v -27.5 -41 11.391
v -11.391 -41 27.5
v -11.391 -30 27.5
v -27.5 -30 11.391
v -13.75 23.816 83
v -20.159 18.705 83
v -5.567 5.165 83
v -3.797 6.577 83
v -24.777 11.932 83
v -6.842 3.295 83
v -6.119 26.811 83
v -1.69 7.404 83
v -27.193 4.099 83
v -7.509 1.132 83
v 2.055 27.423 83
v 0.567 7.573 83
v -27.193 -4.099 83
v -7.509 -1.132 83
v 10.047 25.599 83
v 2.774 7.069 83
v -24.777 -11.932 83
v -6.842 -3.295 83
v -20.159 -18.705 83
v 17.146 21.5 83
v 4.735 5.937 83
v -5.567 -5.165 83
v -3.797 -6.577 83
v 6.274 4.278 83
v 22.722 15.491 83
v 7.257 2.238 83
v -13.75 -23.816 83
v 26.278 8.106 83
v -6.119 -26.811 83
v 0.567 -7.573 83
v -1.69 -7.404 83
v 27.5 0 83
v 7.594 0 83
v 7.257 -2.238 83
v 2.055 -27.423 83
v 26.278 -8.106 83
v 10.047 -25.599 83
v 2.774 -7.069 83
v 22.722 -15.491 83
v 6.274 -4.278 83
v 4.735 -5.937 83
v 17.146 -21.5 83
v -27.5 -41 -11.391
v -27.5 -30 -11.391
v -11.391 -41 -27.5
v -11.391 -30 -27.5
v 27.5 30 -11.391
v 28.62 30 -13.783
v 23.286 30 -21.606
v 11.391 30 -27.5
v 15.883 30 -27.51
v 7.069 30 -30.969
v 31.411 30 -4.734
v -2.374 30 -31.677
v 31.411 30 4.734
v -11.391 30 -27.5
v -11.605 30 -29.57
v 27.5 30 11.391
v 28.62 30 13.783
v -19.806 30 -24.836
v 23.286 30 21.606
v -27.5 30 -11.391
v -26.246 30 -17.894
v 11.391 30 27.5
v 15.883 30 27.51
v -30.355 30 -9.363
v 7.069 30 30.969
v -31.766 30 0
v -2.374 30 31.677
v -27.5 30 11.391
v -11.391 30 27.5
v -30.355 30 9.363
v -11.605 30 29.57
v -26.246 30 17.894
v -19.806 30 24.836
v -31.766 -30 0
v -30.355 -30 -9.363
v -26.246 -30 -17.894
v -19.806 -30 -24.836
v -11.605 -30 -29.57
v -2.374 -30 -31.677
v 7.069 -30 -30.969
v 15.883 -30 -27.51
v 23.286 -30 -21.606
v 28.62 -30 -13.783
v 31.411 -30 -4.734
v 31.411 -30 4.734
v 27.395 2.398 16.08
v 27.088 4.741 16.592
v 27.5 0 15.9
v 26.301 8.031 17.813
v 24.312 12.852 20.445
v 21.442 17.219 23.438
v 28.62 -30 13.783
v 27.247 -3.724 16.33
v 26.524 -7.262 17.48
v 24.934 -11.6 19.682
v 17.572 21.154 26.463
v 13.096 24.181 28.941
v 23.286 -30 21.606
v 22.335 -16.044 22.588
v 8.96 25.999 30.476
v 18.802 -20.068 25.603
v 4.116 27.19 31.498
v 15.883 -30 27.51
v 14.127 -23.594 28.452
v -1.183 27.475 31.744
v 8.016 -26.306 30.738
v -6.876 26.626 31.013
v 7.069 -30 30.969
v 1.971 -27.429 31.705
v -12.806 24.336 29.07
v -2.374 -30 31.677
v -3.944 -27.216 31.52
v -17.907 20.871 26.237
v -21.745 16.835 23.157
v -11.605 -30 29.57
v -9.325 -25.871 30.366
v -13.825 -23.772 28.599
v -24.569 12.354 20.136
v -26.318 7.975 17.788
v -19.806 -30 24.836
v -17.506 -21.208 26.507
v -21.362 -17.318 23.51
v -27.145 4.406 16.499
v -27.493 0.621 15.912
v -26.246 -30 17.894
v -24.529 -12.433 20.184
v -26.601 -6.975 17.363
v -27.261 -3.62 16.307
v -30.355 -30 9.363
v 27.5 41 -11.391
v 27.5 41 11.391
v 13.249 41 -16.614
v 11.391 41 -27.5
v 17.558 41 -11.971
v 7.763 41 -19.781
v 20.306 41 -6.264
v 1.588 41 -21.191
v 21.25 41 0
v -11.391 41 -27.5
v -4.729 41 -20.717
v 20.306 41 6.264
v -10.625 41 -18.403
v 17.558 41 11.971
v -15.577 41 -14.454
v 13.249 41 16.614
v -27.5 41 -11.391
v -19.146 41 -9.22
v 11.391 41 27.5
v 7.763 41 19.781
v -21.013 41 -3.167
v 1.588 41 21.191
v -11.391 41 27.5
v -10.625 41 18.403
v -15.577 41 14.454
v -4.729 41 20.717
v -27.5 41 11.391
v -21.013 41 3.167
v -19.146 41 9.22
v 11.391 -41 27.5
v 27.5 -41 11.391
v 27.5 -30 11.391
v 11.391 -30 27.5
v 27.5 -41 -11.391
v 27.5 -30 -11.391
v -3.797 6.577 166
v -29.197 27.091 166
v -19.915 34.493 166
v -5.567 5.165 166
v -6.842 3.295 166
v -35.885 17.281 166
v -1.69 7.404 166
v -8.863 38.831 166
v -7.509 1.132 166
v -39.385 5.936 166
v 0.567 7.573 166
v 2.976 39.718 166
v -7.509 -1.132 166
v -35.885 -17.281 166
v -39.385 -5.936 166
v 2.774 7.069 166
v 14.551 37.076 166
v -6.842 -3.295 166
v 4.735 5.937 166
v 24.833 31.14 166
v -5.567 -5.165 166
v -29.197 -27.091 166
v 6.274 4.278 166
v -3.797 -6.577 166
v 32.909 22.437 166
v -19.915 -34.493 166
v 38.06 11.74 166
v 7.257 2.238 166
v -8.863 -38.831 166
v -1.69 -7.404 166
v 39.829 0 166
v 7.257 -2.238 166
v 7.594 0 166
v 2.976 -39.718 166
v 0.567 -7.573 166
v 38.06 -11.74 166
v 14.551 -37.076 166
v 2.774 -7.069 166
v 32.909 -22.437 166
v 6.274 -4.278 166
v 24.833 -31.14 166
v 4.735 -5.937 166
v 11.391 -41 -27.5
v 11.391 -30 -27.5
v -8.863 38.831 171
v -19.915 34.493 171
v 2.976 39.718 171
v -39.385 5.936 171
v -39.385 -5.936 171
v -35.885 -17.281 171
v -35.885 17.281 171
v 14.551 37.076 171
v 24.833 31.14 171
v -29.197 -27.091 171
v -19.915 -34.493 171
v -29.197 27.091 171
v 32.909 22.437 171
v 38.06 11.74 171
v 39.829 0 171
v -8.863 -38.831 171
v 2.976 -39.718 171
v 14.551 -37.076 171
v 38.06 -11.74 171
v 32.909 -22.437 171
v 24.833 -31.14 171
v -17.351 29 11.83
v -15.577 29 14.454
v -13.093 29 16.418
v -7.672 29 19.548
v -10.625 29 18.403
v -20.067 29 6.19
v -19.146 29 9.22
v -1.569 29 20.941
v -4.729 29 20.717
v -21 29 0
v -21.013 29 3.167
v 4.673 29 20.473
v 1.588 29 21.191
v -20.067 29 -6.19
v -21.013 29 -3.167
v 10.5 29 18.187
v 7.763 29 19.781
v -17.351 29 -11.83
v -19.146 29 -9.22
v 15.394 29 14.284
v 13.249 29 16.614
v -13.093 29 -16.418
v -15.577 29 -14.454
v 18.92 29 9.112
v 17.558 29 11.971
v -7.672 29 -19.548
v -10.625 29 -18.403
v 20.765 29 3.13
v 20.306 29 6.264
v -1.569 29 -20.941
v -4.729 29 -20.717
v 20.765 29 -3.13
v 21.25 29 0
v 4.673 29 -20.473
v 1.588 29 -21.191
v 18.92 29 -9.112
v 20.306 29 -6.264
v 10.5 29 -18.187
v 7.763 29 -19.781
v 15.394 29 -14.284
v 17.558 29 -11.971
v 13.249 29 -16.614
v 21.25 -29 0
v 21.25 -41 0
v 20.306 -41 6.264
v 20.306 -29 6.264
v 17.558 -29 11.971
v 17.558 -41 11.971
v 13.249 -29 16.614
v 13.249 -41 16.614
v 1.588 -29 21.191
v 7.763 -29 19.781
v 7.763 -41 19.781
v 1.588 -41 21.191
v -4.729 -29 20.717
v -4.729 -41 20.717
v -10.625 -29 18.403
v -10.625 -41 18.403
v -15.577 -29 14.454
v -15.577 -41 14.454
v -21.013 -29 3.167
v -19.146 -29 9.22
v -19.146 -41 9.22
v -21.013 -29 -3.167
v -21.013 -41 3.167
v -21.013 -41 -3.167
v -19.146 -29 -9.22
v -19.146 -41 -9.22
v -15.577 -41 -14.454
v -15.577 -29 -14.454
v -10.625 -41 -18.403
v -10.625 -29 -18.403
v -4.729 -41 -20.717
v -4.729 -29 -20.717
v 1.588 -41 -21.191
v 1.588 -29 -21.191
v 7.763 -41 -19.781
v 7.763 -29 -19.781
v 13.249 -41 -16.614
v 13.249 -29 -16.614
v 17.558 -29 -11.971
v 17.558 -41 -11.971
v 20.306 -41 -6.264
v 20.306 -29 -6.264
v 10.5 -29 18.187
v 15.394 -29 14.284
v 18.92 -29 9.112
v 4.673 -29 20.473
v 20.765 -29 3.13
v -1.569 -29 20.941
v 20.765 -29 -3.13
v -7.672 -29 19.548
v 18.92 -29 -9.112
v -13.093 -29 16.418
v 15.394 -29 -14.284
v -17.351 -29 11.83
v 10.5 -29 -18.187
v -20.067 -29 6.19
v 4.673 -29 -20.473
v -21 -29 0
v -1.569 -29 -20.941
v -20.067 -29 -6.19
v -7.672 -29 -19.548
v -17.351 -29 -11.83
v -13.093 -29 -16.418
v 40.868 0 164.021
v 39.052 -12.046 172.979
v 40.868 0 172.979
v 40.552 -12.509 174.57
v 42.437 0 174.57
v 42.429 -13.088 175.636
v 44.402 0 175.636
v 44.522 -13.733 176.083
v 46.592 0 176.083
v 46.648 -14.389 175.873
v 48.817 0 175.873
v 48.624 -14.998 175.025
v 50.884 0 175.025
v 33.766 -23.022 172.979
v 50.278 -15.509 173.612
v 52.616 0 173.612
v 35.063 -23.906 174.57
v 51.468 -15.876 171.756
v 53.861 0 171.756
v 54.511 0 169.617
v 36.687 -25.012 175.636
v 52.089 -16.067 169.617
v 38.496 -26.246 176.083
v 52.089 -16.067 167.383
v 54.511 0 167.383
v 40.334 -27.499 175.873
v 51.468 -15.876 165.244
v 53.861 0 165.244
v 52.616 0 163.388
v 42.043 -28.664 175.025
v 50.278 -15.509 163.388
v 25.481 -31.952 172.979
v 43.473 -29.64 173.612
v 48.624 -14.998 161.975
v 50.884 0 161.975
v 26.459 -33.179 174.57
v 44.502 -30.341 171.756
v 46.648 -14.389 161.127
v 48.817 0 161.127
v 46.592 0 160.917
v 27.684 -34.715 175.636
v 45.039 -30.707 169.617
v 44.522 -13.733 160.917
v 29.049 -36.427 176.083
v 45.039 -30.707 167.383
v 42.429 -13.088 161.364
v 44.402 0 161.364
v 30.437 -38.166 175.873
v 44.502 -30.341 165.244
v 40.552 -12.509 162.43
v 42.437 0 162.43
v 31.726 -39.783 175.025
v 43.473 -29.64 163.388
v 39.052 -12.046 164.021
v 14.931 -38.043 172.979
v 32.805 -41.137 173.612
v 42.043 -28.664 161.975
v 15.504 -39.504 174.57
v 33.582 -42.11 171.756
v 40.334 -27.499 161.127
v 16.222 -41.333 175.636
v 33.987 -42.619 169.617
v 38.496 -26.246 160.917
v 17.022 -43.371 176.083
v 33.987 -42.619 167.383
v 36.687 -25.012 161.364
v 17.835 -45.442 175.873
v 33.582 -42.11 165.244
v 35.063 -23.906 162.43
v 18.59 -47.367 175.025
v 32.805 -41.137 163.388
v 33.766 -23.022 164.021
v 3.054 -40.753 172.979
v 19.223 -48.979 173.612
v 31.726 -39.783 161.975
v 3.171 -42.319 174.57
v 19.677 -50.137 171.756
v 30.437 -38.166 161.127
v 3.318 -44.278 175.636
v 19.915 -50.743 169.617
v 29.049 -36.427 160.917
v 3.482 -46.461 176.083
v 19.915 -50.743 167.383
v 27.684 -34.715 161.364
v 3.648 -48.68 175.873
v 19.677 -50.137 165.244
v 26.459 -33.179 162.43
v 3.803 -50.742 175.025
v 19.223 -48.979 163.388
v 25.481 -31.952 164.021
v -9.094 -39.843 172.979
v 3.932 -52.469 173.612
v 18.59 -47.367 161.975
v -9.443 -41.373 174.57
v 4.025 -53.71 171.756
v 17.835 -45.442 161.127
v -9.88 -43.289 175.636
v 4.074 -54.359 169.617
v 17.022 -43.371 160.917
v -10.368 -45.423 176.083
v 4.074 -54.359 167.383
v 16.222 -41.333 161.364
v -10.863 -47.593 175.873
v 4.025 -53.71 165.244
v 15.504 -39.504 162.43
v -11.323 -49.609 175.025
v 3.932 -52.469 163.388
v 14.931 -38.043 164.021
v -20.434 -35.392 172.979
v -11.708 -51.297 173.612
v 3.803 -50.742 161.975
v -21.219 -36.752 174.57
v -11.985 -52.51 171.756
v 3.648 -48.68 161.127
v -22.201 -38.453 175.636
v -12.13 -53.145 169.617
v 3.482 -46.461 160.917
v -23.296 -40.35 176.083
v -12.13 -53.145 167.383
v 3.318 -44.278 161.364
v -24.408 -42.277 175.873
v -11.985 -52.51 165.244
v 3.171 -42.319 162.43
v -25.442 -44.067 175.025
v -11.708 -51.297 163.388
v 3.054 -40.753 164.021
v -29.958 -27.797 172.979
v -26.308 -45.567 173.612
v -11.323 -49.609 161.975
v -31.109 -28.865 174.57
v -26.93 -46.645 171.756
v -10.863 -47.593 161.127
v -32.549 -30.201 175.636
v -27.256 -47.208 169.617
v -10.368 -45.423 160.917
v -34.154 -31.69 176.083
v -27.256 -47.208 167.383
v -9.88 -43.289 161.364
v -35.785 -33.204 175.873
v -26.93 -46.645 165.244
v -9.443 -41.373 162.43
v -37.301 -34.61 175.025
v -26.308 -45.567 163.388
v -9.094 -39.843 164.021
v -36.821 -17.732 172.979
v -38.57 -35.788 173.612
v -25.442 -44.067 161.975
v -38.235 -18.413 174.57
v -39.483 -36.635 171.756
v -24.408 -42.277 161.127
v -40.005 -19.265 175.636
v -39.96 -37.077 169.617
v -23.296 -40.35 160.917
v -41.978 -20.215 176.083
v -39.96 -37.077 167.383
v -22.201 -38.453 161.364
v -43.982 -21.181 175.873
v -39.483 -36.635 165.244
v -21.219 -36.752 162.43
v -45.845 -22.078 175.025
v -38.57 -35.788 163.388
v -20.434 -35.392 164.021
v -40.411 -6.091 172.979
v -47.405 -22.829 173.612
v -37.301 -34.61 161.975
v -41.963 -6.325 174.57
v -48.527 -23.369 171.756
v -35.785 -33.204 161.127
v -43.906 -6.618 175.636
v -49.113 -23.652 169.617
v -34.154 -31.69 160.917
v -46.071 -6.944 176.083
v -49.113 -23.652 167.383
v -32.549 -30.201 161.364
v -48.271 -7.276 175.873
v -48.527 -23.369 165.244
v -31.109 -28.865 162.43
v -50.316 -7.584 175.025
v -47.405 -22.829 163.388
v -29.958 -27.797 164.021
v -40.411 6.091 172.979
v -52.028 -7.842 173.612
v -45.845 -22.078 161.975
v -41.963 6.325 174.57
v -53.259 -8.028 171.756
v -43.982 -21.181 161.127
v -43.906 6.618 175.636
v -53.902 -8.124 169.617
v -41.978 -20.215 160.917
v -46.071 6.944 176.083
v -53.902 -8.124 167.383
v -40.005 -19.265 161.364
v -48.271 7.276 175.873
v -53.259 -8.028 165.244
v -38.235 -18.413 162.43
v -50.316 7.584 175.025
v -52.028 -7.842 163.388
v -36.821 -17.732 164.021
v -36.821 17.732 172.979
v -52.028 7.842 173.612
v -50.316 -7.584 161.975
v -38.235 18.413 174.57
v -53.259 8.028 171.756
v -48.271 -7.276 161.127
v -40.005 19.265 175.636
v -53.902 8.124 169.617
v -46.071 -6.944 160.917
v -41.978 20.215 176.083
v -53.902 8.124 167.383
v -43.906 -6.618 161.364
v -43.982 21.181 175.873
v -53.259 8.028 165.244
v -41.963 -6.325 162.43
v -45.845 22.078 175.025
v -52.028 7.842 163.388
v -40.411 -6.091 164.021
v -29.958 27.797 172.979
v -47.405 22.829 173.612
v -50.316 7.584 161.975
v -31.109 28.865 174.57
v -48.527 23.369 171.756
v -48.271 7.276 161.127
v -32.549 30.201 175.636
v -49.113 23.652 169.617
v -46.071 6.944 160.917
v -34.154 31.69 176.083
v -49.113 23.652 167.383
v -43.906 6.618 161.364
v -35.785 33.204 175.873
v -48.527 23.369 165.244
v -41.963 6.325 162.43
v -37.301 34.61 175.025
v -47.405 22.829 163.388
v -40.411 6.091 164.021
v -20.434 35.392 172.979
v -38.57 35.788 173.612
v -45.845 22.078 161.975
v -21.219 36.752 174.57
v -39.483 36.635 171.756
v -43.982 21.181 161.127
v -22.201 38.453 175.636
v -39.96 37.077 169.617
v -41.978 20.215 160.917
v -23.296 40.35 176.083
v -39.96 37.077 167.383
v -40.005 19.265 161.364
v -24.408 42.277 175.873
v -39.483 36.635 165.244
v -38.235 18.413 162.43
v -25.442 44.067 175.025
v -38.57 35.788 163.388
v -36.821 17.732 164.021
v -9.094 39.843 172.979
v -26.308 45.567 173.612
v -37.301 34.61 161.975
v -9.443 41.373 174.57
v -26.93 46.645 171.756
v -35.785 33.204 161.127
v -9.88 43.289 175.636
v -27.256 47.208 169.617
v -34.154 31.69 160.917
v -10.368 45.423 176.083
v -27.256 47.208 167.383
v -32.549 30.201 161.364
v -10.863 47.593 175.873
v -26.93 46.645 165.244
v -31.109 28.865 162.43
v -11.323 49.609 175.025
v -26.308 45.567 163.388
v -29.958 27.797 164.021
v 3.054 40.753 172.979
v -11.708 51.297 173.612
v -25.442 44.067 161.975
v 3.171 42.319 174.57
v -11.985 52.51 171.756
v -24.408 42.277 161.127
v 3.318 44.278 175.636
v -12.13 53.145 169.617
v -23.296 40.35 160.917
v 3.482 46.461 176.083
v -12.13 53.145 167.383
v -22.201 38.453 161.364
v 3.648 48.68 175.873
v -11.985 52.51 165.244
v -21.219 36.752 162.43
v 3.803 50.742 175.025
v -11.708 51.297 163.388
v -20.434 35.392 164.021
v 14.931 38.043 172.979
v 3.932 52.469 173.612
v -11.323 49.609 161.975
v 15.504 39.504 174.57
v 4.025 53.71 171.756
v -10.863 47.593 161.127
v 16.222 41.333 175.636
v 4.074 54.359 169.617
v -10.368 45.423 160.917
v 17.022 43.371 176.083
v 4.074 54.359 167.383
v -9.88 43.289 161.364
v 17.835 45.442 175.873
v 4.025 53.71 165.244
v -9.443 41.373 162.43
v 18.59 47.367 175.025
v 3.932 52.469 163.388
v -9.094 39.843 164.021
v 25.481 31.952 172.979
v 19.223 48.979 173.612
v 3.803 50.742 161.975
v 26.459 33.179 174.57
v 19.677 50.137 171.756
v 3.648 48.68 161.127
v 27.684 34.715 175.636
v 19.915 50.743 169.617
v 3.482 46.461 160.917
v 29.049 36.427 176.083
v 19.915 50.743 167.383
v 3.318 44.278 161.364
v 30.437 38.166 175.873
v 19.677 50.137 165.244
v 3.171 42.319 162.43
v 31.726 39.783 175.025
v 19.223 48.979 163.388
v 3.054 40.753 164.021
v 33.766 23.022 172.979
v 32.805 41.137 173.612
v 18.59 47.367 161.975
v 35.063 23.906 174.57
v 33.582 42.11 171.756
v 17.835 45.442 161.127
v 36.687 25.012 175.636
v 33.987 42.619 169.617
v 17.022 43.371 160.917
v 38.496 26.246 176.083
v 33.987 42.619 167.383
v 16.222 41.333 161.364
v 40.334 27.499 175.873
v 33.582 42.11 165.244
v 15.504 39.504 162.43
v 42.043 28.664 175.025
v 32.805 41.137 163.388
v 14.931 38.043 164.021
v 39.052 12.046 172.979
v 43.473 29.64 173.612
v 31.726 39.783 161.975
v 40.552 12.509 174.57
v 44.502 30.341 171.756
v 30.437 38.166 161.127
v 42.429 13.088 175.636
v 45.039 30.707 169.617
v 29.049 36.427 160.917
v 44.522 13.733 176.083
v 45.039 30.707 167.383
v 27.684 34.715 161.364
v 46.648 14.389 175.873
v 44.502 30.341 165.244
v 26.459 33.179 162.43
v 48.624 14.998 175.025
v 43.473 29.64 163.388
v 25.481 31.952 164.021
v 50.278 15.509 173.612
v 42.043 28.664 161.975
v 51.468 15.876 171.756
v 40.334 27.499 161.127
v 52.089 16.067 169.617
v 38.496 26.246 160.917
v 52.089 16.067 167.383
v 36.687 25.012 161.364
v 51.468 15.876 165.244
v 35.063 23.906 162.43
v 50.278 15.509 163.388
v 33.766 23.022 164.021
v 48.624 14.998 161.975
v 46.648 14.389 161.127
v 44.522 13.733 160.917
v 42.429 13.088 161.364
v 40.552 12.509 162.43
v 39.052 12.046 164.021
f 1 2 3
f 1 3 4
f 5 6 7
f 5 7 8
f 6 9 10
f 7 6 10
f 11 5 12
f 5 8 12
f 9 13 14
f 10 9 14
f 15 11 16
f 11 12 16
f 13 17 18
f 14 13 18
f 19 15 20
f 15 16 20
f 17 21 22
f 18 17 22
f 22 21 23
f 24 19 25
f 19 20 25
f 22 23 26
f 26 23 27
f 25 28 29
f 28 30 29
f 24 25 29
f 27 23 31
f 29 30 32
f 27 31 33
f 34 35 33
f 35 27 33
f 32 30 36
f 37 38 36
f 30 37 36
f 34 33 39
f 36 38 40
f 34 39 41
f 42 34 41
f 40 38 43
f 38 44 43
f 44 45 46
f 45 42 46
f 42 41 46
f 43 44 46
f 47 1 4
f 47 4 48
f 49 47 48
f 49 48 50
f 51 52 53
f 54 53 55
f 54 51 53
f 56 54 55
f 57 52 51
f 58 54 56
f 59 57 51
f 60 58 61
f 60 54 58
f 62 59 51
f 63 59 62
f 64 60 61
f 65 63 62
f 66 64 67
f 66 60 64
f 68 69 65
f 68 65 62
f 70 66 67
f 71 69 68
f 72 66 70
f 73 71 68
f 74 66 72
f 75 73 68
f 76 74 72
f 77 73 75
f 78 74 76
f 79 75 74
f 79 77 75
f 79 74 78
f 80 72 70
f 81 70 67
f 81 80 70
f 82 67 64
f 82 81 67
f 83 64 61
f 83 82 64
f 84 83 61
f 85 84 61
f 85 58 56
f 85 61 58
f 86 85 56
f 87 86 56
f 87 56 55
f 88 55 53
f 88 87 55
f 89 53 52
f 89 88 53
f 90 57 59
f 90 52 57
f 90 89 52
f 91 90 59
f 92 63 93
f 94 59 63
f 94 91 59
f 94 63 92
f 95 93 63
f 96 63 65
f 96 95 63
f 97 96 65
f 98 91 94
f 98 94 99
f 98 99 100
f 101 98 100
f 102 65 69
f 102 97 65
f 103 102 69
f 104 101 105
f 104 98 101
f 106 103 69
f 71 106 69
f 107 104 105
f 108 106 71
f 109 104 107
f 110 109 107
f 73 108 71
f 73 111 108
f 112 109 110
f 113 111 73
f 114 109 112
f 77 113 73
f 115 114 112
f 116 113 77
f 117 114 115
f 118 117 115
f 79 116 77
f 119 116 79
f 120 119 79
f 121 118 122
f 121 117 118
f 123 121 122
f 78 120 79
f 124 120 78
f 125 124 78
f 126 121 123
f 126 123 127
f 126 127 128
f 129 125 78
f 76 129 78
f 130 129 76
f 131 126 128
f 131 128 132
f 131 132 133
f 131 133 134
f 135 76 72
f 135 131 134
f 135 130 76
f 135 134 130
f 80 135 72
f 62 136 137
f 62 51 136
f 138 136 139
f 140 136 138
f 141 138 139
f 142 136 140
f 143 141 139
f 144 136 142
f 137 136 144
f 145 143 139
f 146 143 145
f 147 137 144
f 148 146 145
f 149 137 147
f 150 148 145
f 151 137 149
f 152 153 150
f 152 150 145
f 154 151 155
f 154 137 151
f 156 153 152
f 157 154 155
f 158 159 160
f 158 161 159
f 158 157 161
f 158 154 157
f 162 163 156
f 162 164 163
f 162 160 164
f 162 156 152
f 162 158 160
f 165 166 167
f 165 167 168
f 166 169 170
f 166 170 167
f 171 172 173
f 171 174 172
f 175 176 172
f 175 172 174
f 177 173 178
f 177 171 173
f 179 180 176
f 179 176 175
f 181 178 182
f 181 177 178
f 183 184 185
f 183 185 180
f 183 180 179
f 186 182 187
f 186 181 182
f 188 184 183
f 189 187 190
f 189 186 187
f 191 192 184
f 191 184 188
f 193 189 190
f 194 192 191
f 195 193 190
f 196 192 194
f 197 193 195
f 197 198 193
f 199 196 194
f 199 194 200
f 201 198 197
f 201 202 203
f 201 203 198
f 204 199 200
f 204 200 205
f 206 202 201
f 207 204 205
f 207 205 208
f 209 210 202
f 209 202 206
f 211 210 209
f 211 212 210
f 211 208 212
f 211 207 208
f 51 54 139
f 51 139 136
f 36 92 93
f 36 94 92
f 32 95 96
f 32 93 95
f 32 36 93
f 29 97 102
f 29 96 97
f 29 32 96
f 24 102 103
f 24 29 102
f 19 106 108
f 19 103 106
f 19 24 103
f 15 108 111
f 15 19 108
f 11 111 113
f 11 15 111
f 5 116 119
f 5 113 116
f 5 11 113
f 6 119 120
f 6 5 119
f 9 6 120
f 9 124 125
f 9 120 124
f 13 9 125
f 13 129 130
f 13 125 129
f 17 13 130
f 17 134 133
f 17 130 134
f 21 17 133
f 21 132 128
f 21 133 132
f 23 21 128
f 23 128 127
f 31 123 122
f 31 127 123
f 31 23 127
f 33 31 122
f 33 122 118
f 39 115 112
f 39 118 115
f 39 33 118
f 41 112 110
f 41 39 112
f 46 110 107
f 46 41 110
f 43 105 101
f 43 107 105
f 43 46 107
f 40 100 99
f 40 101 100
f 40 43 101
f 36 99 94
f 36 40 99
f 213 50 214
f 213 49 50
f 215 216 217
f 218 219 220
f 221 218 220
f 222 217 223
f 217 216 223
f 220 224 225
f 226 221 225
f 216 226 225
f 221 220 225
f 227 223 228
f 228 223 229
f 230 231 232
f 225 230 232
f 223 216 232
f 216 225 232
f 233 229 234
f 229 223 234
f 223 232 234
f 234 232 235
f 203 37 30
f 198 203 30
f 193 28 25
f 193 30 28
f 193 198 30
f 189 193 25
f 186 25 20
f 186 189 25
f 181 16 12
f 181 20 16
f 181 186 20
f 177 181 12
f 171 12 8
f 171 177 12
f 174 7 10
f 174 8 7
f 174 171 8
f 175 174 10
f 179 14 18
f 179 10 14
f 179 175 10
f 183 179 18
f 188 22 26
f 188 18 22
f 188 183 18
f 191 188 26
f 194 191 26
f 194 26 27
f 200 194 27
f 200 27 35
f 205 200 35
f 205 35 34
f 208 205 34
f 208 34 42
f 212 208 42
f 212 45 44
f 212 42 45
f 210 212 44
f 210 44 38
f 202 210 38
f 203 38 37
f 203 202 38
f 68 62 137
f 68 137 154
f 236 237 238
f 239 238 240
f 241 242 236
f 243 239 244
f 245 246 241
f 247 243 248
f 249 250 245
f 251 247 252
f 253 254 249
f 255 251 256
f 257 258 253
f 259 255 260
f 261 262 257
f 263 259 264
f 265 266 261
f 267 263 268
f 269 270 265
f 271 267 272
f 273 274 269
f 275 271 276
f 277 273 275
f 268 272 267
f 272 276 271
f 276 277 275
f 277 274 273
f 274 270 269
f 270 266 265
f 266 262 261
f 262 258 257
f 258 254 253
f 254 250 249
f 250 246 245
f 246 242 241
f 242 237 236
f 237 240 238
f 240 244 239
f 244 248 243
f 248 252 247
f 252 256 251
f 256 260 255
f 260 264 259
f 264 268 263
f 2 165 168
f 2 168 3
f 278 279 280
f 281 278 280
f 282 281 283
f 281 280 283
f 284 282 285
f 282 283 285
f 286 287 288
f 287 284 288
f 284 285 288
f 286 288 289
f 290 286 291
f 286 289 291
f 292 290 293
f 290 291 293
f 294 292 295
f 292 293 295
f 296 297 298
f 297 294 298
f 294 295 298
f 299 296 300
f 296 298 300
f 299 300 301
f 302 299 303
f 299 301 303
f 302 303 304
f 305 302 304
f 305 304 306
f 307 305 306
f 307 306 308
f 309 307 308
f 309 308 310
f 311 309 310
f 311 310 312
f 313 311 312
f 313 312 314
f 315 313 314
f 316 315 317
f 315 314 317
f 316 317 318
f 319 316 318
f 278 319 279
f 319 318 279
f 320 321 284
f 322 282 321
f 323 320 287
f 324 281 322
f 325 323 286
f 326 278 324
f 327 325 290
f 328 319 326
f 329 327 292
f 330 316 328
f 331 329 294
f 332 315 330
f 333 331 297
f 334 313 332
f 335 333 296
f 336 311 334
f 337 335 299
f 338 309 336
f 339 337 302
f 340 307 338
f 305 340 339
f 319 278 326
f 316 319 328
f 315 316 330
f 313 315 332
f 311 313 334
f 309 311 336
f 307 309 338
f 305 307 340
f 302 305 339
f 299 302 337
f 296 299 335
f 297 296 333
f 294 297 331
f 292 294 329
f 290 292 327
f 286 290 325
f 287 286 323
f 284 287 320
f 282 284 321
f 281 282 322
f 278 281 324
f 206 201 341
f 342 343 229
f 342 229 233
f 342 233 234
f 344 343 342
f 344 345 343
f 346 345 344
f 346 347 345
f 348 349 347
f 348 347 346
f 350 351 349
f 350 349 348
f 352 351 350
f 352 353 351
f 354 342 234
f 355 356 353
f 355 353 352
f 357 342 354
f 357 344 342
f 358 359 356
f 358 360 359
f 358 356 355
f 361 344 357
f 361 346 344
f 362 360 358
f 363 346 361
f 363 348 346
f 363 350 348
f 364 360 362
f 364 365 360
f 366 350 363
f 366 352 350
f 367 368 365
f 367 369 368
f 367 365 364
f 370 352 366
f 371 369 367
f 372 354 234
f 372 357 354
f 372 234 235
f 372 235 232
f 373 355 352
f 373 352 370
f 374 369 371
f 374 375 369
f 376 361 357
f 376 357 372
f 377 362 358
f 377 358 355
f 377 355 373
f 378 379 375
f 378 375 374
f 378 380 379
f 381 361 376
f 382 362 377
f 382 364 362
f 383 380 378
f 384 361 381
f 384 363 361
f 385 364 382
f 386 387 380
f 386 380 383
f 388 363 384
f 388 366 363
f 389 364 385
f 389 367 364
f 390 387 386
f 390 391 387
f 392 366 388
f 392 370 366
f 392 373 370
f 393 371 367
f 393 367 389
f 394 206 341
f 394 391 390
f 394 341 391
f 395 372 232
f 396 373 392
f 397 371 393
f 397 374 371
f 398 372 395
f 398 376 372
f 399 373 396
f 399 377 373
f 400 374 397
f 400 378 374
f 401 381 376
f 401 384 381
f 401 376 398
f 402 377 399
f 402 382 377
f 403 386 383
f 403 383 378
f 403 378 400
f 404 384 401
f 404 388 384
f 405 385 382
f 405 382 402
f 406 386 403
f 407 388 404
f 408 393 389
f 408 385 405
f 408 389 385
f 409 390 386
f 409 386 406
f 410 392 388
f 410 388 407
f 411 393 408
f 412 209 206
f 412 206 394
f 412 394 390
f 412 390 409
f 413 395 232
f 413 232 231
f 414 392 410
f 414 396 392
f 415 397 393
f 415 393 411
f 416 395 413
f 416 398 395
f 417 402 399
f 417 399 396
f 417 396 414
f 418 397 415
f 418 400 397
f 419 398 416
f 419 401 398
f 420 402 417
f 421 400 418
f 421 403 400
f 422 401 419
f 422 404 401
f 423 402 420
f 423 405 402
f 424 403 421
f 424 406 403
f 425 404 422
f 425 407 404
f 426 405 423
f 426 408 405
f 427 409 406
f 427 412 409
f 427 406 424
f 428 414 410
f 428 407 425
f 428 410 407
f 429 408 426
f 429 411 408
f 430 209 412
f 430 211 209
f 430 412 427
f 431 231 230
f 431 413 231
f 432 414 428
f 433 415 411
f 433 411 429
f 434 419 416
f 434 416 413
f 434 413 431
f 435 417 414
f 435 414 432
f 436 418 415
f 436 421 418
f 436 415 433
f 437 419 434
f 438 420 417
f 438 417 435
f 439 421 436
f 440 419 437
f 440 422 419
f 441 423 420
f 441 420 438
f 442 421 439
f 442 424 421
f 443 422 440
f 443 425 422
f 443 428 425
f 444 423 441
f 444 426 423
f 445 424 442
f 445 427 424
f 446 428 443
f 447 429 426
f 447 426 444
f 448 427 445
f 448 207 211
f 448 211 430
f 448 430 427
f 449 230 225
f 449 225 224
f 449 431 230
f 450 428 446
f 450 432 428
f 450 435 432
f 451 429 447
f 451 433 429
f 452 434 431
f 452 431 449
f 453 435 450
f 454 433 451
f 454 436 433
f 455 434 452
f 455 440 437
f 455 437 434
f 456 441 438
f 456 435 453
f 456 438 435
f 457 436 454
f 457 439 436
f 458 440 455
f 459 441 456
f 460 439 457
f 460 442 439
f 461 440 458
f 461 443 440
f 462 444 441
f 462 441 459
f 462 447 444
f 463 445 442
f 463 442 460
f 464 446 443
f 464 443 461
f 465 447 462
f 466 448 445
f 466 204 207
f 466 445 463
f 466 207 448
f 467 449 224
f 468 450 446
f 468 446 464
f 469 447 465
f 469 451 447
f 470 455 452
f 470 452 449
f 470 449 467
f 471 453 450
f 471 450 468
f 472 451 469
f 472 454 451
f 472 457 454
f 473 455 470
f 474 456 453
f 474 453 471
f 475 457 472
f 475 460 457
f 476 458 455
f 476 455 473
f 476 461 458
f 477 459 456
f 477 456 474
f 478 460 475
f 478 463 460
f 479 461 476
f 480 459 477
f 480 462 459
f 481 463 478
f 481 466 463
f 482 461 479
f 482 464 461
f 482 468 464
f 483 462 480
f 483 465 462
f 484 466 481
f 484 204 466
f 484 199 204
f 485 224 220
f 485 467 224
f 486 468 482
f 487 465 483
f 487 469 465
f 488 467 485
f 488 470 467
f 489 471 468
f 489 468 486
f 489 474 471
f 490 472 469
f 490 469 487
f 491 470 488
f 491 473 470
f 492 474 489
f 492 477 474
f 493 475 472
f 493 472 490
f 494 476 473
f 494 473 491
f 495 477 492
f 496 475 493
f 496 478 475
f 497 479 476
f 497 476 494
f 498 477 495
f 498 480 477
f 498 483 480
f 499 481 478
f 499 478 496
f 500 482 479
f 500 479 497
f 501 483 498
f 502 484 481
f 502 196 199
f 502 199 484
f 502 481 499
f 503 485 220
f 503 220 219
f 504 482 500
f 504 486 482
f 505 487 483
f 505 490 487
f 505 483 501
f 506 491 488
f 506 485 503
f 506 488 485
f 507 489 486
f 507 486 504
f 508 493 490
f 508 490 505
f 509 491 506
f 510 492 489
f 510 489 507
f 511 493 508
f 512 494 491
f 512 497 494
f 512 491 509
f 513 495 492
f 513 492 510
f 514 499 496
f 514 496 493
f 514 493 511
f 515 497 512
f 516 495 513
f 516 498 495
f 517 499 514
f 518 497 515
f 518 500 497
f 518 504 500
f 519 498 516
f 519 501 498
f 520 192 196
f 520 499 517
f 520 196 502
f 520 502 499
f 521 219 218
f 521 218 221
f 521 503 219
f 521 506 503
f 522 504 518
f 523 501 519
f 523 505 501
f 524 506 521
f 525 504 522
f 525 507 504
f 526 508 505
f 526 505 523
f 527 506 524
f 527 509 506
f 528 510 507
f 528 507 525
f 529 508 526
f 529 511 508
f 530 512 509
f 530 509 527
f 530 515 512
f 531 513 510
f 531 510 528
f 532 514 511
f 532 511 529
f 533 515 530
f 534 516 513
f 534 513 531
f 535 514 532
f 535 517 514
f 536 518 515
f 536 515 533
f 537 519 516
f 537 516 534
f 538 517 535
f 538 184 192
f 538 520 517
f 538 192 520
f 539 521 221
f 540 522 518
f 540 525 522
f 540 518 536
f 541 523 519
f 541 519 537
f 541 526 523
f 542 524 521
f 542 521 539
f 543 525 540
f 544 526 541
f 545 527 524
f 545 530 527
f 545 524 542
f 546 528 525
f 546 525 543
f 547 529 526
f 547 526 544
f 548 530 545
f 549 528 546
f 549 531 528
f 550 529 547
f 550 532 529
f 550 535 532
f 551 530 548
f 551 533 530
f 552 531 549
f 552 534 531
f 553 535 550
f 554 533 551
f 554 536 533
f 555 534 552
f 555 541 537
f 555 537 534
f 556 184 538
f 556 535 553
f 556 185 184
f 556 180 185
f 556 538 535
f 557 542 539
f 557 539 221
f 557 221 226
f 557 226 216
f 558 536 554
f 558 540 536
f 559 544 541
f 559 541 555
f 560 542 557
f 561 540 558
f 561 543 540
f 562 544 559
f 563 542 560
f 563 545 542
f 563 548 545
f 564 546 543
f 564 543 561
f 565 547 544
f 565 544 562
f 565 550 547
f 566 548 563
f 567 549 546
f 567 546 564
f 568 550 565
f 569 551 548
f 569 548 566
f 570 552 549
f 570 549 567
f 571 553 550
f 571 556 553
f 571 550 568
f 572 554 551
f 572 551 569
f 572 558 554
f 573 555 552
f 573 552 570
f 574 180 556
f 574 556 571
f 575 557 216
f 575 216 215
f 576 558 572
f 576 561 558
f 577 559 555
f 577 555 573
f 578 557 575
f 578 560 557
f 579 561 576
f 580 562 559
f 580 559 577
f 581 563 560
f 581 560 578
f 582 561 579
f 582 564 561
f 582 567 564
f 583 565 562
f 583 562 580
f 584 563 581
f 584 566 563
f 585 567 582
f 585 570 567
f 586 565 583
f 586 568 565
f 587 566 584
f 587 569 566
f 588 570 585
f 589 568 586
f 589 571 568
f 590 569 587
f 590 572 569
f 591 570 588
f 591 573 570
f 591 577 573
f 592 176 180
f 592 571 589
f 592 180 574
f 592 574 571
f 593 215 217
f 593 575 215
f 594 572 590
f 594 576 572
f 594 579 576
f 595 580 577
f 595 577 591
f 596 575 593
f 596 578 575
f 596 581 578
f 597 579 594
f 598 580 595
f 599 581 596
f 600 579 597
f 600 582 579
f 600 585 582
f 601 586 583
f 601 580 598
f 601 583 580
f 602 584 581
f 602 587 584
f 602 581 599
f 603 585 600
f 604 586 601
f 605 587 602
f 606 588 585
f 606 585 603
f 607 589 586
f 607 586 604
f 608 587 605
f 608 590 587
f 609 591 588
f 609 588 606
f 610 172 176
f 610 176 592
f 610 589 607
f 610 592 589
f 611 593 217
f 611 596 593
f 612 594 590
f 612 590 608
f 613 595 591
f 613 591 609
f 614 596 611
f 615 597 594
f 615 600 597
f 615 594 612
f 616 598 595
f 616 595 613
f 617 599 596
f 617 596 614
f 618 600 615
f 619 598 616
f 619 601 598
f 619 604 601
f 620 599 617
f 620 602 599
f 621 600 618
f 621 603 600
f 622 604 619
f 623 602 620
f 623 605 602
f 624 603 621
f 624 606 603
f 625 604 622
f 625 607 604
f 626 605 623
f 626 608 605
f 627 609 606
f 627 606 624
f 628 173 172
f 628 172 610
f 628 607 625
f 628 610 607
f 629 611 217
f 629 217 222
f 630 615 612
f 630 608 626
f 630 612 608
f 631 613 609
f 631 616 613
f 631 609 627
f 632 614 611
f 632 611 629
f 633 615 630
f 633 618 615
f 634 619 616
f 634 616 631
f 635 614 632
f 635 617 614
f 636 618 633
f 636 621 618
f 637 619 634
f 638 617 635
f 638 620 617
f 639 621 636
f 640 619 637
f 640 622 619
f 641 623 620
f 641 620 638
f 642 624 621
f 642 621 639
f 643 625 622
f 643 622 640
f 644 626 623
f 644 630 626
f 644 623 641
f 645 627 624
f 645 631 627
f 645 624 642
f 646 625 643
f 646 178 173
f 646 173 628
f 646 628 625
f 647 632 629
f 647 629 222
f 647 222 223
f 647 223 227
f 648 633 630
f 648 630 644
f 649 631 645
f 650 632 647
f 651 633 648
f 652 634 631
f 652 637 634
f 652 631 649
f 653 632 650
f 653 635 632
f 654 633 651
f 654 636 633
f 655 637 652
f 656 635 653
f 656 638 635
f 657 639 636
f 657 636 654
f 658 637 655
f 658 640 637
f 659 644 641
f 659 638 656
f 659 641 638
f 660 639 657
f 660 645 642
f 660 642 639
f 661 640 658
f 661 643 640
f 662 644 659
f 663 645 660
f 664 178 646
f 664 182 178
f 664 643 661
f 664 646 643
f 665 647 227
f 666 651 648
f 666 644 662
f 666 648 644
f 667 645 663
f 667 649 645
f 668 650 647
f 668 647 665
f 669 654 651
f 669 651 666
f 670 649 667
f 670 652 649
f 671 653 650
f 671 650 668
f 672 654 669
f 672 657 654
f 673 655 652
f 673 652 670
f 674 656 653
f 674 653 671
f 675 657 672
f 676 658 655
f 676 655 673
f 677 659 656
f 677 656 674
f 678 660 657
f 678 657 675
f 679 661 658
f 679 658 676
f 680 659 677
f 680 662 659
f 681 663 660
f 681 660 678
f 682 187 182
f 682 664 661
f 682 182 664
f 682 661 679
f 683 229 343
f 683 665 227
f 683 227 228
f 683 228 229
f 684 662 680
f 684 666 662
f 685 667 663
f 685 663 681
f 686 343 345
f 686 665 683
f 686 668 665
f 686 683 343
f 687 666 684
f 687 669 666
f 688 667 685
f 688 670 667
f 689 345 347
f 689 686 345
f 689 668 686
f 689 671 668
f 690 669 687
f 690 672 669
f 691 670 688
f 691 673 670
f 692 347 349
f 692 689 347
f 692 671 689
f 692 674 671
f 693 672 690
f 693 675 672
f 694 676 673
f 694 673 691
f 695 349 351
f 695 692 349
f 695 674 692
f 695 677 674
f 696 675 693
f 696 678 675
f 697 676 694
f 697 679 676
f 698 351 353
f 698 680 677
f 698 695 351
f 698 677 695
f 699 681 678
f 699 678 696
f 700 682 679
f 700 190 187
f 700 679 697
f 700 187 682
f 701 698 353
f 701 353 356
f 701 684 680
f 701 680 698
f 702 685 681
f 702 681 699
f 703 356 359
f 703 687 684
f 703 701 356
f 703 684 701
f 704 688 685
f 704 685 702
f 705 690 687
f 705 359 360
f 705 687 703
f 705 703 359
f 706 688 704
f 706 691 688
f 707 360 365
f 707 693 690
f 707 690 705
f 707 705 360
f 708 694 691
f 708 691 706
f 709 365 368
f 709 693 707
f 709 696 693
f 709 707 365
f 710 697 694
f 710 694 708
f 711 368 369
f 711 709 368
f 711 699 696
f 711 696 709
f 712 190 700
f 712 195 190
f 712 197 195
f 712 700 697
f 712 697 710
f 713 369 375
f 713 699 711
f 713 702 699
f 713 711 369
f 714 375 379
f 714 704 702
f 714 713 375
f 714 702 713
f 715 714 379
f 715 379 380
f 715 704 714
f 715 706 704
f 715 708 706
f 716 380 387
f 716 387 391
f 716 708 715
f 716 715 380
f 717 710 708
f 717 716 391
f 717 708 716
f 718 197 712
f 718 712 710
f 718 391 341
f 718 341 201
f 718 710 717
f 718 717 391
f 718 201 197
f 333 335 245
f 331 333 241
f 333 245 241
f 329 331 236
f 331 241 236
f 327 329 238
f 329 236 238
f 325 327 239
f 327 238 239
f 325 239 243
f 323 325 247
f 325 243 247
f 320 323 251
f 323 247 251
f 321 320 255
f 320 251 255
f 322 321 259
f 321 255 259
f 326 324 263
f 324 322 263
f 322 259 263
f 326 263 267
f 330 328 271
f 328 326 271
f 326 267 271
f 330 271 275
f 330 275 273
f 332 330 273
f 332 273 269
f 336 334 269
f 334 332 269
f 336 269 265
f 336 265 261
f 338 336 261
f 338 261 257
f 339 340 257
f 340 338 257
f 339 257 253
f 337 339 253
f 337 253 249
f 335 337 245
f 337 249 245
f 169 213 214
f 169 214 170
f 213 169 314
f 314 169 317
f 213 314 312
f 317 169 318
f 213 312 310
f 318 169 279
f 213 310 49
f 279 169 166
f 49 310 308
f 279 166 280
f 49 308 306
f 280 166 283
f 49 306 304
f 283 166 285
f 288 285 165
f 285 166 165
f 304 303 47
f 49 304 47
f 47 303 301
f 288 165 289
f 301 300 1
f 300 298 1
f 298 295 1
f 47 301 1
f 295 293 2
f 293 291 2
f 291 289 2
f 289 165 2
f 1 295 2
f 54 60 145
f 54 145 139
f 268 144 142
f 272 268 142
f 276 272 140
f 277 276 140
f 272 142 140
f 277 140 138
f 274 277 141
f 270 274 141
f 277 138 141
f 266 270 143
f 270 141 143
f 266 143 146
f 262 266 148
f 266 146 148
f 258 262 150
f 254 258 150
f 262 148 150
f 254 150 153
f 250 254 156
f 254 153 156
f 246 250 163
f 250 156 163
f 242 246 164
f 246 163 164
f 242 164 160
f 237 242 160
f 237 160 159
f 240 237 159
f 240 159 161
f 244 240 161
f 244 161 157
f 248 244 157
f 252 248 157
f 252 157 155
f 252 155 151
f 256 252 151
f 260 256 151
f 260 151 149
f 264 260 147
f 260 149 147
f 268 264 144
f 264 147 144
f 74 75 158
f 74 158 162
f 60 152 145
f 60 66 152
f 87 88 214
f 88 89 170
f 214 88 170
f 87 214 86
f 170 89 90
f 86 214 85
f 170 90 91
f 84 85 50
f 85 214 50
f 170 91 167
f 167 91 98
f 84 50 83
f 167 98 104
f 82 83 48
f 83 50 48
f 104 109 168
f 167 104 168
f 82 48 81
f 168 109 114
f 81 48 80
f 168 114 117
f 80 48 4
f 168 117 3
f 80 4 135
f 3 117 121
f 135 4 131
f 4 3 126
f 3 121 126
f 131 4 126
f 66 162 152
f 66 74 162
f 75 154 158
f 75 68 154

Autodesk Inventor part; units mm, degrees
ref_plane "YZ Plane" through (0, 0, 0) normal (1, 0, 0) x (0, 1, 0)
ref_plane "XZ Plane" through (0, 0, 0) normal (0, 1, 0) x (-1, 0, 0)
ref_plane "XY Plane" through (0, 0, 0) normal (0, 0, 1) x (1, 0, 0)
sketch "Sketch3" plane through (0, 0, 0) normal (0, 1, 0) x (-1, 0, 0)
  line L0 (-11.3909, 27.5) -> (11.3909, 27.5)
  line L1 (11.3909, 27.5) -> (27.5, 11.3909)
  line L2 (27.5, 11.3909) -> (27.5, -11.3909)
  line L3 (27.5, -11.3909) -> (11.3909, -27.5)
  line L4 (11.3909, -27.5) -> (-11.3909, -27.5)
  line L5 (-11.3909, -27.5) -> (-27.5, -11.3909)
  line L6 (-27.5, -11.3909) -> (-27.5, 11.3909)
  line L7 (-27.5, 11.3909) -> (-11.3909, 27.5)
  circle A0 centre (0, 0) radius 29.7658
  circle A1 centre (0, 0) radius 27.5
  circle A2 centre (0, 0) radius 21
  circle A3 centre (0, 0) radius 31.7658
  line L8 (0, 0) -> (-27.5, 0)
  line L9 (-27.5, 0) -> (-27.5, 83)
  line L10 (-27.5, 83) -> (0, 83)
  line L11 (0, 83) -> (0, 0)
  line L12 (0, 83) -> (-7.5939, 83)
  line L13 (-7.5939, 83) -> (-7.5939, 166)
  line L14 (-7.5939, 166) -> (0, 166)
  line L15 (0, 166) -> (0, 83)
  line L16 (0, 166) -> (-47, 166)
  line L17 (-47, 166) -> (-47, 171)
  line L18 (-47, 171) -> (0, 171)
  line L19 (0, 171) -> (0, 166)
  circle A4 centre (-47, 168.5) radius 7.5939
  dimension "oSW" = 55
  dimension "oIntDia" = 42
  dimension "d16" = 2
  dimension "oWheelDia" = 94
  dimension "d51" = 5
  dimension "d52" = 15.1878
  dimension "oStemHeight" = 171
  dimension "d57" = 15.1878
  dimension "d58" = 22.7817
revolve "Revolution1" add sketch "Sketch3" angle 360 about axis through (0, 0, 166) along (0, 0, -1) picked at (-6.365, 27.9172) picked at (-16.0373, 26.4927) picked at (-1.7883, 25.1572) picked at (-13.8245, 1.5576) contours A0 L11 L0 | L0 A1 L7 | L7 A0 | A0 L9 A3 L11 | L11 A2 L8 A1 | A1 L6 L7 | L11 L8 A2 | L9 L10 L11 A3 | L10 L13 L14 L15 | L14 L16 A4 L18 L19 | A4 L18 L17 L16 | L16 L17 L18 A4
extrude "Extrusion1" add sketch "Sketch3" along normal mid plane 82 separate body contours L0 A1 L7 | L0 L1 A1 | L11 A2 L8 A1 | A1 L8 A2 L11 | A1 L6 L7 | L1 L2 A1 | A1 L5 L6 | L2 L3 A1 | A1 L4 L5 | L3 L4 A1
extrude "Extrusion12" cut sketch "Sketch3" along normal through all both and the other way through all contours L11 L8 A2 | A2 L8 L11
extrude "Extrusion2" add sketch "Sketch3" along normal mid plane 60 contours A0 L11 L0 | L7 A0 | A0 L9 A3 L11 | L11 A0 L0 | L6 A0 | A0 L11 A3 L9 | A0 L1 | L5 A0 | A0 L2 | L4 A0 | A0 L3
sketch "Sketch10" plane through (0, 41, 0) normal (0, 1, 0) x (1, 0, 0)
  circle A0 centre (0, 0) radius 21 projected
  circle A1 centre (0, 0) radius 21.25
  dimension "d44" = 0.25
extrude "Extrusion11" cut sketch "Sketch10" against normal blind 12
mirror "Mirror1" about plane through (0, 0, 0) normal (0, 1, 0) of "Extrusion11"
equation "\"d52\" = 0.666667 * d58"
equation "\"d57\" = d52"
properties part number "Manual Threaded Ball Valve DN40 S235" material "S235"
